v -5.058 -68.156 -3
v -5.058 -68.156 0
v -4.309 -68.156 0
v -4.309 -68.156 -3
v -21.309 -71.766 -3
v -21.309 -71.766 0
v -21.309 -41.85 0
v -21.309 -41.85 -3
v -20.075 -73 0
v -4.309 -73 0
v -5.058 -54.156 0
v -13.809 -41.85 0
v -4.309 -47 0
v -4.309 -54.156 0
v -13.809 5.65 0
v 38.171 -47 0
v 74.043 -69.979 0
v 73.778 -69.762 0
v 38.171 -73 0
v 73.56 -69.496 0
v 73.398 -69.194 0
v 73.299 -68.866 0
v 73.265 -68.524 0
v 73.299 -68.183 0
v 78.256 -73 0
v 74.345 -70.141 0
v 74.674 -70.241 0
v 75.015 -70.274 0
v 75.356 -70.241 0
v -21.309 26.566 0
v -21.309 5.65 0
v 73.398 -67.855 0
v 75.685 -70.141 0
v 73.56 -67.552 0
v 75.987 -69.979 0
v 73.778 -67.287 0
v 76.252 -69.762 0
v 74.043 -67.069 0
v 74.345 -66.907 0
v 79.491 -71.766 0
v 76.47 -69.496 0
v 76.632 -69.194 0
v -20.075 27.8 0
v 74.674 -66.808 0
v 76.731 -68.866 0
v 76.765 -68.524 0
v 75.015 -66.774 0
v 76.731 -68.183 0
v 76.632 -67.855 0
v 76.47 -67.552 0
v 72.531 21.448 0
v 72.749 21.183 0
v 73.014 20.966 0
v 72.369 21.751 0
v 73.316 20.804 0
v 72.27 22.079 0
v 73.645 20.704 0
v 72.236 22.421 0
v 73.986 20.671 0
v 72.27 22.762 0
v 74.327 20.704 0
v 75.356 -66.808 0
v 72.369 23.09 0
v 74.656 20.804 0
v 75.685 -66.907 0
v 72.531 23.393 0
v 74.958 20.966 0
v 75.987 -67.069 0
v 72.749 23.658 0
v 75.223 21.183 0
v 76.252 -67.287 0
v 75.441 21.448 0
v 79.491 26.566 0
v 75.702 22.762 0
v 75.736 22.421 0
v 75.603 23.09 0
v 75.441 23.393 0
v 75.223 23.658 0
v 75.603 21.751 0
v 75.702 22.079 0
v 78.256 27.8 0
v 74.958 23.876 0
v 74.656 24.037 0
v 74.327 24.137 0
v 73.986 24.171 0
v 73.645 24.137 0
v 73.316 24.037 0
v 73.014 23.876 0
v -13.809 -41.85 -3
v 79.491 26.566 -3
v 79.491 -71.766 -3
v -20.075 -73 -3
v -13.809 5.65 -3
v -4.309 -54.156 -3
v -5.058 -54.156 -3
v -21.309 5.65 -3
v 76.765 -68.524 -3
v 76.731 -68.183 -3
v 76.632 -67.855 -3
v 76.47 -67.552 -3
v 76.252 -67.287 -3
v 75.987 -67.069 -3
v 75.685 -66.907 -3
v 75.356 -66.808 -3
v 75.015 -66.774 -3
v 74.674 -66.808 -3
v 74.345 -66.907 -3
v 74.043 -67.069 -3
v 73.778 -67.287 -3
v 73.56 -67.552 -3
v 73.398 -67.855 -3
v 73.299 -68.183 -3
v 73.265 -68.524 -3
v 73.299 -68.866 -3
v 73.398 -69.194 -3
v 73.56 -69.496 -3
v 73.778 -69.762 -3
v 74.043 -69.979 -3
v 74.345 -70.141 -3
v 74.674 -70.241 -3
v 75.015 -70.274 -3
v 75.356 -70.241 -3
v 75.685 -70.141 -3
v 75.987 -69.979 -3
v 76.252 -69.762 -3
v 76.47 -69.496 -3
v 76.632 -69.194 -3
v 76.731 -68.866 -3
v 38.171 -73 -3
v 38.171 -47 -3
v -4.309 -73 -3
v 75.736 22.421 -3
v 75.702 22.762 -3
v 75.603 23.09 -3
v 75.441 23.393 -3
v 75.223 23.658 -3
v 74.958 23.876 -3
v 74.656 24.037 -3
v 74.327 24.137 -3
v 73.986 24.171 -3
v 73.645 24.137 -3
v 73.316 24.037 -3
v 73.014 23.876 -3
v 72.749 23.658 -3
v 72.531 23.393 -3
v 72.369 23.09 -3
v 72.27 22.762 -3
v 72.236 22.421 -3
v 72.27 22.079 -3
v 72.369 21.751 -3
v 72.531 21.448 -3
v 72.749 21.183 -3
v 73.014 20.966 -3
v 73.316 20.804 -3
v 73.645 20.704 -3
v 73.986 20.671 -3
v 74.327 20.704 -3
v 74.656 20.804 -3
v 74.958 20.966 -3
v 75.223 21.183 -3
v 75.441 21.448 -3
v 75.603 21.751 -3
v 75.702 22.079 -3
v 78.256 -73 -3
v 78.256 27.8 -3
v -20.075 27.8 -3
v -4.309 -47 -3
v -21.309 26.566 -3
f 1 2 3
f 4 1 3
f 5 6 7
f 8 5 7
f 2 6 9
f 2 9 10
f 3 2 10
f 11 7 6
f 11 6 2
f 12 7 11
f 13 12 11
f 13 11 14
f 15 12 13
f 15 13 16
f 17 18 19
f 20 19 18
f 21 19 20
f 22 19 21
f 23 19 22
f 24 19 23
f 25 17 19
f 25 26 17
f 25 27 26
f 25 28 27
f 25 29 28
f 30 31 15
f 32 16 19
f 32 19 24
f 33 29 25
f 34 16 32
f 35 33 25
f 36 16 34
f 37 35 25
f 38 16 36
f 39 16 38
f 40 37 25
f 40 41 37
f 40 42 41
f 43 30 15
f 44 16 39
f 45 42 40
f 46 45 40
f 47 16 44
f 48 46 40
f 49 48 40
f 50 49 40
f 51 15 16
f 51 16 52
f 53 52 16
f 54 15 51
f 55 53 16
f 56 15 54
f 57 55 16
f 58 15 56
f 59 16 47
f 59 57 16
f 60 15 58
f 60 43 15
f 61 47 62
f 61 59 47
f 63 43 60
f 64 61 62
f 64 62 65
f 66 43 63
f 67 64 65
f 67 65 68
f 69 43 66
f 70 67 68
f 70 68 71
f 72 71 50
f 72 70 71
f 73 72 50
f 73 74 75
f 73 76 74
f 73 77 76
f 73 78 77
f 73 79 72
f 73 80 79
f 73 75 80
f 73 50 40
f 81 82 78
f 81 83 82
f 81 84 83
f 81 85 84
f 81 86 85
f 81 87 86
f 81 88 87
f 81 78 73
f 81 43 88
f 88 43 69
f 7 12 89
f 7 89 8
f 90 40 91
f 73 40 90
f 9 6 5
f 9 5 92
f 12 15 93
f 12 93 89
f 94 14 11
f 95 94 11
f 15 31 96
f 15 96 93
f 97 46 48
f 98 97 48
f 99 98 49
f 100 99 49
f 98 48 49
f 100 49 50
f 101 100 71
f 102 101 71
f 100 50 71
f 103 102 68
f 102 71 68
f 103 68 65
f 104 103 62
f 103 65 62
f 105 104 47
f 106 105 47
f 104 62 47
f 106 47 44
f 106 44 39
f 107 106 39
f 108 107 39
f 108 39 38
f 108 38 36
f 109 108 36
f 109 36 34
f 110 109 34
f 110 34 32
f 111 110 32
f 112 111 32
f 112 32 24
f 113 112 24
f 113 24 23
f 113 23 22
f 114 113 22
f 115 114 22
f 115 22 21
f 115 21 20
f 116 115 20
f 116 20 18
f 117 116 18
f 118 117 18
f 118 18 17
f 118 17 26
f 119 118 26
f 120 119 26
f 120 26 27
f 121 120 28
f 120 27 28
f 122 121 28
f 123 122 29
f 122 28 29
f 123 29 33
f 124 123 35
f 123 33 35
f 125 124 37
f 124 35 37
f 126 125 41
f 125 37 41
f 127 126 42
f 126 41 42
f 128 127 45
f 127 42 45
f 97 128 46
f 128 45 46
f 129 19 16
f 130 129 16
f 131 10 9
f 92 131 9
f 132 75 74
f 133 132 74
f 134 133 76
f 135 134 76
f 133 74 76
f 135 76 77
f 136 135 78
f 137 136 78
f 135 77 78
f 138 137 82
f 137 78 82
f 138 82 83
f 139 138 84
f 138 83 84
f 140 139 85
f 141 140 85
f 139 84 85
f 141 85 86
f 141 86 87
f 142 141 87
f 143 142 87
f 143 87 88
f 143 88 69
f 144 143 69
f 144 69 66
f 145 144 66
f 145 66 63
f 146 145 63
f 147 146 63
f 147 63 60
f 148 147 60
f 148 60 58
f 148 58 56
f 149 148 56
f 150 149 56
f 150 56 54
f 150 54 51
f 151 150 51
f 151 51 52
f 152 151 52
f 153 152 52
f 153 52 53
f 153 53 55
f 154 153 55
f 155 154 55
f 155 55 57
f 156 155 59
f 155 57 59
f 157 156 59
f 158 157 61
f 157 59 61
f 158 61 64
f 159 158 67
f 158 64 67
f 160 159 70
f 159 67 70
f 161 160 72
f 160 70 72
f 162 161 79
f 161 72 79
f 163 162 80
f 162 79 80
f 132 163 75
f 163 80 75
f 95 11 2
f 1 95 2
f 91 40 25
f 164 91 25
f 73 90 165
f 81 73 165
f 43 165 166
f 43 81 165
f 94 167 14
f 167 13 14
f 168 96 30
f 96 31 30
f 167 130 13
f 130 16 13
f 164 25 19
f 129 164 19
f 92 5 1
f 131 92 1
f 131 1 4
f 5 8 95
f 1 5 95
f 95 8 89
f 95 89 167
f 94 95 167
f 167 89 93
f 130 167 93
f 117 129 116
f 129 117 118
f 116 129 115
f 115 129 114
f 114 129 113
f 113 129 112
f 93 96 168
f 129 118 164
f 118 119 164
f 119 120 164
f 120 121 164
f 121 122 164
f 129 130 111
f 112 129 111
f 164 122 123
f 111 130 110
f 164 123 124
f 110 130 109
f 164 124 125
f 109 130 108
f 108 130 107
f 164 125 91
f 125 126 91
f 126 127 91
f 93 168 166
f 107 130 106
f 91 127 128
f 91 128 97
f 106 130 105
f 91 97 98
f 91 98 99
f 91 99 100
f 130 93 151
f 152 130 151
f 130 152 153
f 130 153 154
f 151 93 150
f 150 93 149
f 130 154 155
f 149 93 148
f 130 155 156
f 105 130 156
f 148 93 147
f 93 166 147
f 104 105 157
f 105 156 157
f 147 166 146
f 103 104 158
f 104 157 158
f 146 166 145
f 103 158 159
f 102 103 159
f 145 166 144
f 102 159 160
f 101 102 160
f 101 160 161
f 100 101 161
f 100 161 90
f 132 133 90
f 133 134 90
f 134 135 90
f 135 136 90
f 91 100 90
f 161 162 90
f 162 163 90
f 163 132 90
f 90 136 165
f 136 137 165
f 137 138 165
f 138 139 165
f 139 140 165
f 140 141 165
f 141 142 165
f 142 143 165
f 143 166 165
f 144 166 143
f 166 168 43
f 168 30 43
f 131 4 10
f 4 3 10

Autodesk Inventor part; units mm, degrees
ref_plane "YZ Plane" through (0, 0, 0) normal (1, 0, 0) x (0, 1, 0)
ref_plane "XZ Plane" through (0, 0, 0) normal (0, 1, 0) x (-1, 0, 0)
ref_plane "XY Plane" through (0, 0, 0) normal (0, 0, 1) x (1, 0, 0)
sketch "Sketch1" plane through (0, 0, 0) normal (0, 0, 1) x (1, 0, 0)
  line L0 (81.4908, -72.5941) -> (81.4908, 27.3941)
  line L1 (79.0849, 29.8) -> (81.4908, 27.3941)
  line L2 (-20.9033, 29.8) -> (79.0849, 29.8)
  line L3 (-23.3092, 27.3941) -> (-20.9033, 29.8)
  line L4 (-23.3092, -72.5941) -> (-23.3092, 27.3941)
  line L5 (-20.9033, -75) -> (-23.3092, -72.5941)
  line L6 (-4.3092, -75) -> (-20.9033, -75)
  line L7 (-4.3092, -73) -> (-4.3092, -75)
  line L8 (-4.3092, -73) -> (-20.0749, -73)
  line L9 (-21.3092, -71.7657) -> (-21.3092, 26.5657)
  line L10 (78.2565, 27.8) -> (-20.0749, 27.8)
  line L11 (79.4908, 26.5657) -> (78.2565, 27.8)
  line L12 (79.4908, -71.7657) -> (79.4908, 26.5657)
  line L13 (79.4908, -71.7657) -> (78.2565, -73)
  line L14 (78.2565, -73) -> (32.1708, -73)
  line L15 (32.1708, -75) -> (32.1708, -73)
  line L16 (79.0849, -75) -> (32.1708, -75)
  line L17 (79.0849, -75) -> (81.4908, -72.5941)
  line L18 (-4.3092, -75) -> (-23.3092, -75)
  line L19 (-23.3092, -75) -> (-23.3092, -73)
  line L20 (-23.3092, -73) -> (-4.3092, -73)
  line L21 (-4.3092, -73) -> (-4.3092, -75)
  line L22 (-21.3092, -59.0157) -> (-23.3092, -59.0157)
  line L23 (-23.3092, -59.0157) -> (-23.3092, -75)
  line L24 (-23.3092, -75) -> (-21.3092, -75)
  line L25 (-21.3092, -75) -> (-21.3092, -59.0157)
  line L26 (-20.9092, 18.65) -> (-20.9092, 26.4) construction
  line L27 (-20.9092, 26.4) -> (-19.9092, 27.4) construction
  line L28 (-19.9092, 27.4) -> (-12.1888, 27.4) construction
  line L29 (-21.3092, 18.65) -> (-21.3092, 26.5657)
  line L30 (-21.3092, 26.5657) -> (-20.0749, 27.8)
  line L31 (-20.0749, 27.8) -> (-12.1888, 27.8)
  line L32 (-22.7184, -70.3564) -> (-18.2476, -74.8272)
  line L33 (-22.7184, -70.3564) -> (-16.3958, -70.3564) construction
  line L34 (-4.3092, -75) -> (32.1708, -75)
  line L35 (32.1708, -75) -> (32.1708, -47)
  line L36 (32.1708, -47) -> (-4.3092, -47)
  line L37 (-4.3092, -47) -> (-4.3092, -75)
  circle A0 centre (-17.5342, -45.35) radius 1.75
  circle A1 centre (73.986, 22.4207) radius 1.75
  circle A2 centre (75.015, -68.5242) radius 1.75
  line L38 (-20.0749, -73) -> (-21.3092, -71.7657)
  line L39 (-21.3092, 26.5657) -> (-20.0749, 27.8)
  point P0 (0, 0)
  point P1 (-7.3249, -73)
  point P2 (-21.3092, -71.7657)
  point P3 (-20.0749, -73)
  point P4 (-17.9077, 27.8)
  point P5 (-21.3092, 18.65)
  point P6 (-21.3092, -74.5941)
extrude "Extrusion1" add sketch "Sketch1" against normal blind 3 contours L35 L36 L37 L8 L32 L9 L30 L10 L11 L12 L13 L14
sketch "Sketch2" plane through (0, 0, 0) normal (0, 0, 1) x (1, 0, 0)
  line L0 (-21.3092, -71.7657) -> (-21.3092, 26.5657) projected
  line L1 (-21.3092, 5.65) -> (-13.8092, 5.65)
  line L2 (-13.8092, 5.65) -> (-13.8092, -41.85)
  line L3 (-13.8092, -41.85) -> (-21.3092, -41.85)
  line L4 (-21.3092, -41.85) -> (-21.3092, 5.65)
  circle A0 centre (-17.5342, -45.35) radius 1.75 projected
  point P0 (0, 0)
  point P1 (-17.5592, 5.65)
  dimension "d6" = 7.5
  dimension "d7" = 3.5
  dimension "d8" = 47.5
extrude "Extrusion2" cut sketch "Sketch2" against normal blind 3 contours L0 L1 L2 L3
sketch "Sketch3" plane through (0, 0, 0) normal (0, 0, 1) x (1, 0, 0)
  circle A0 centre (-17.5342, -45.35) radius 1.75 projected
  point P0 (0, 0)
extrude "Extrusion3" add sketch "Sketch3" against normal up to surface (3 mm away)
sketch "Sketch4" plane through (0, 0, 0) normal (0, 0, 1) x (1, 0, 0)
  line L0 (-3.3235, -61.1555) -> (-1.2915, -61.1555) projected
  line L1 (0.4425, -54.1555) -> (-5.0575, -54.1555)
  line L2 (-5.0575, -54.1555) -> (-5.0575, -68.1555)
  line L3 (-5.0575, -68.1555) -> (0.4425, -68.1555)
  line L4 (0.4425, -68.1555) -> (0.4425, -54.1555)
  line L5 (0.4425, -54.1555) -> (-5.0575, -68.1555) construction
  line L6 (-5.0575, -54.1555) -> (0.4425, -68.1555) construction
  point P0 (0, 0)
  point P1 (-2.3075, -61.1555)
  dimension "d13" = 5.5
  dimension "d14" = 14
extrude "Extrusion4" cut sketch "Sketch4" against normal up to surface (3 mm away)
sketch "Sketch5" plane through (0, 0, 0) normal (0, 0, 1) x (1, 0, 0)
  point P0 (0, 0)
sketch "Sketch6" plane through (0, 0, 0) normal (0, 0, 1) x (1, 0, 0)
  line L0 (-5.0575, -54.1555) -> (-4.3092, -54.1555) projected
  line L1 (-4.3092, -54.1555) -> (-4.3092, -47) projected
  line L2 (-4.3092, -47) -> (32.1708, -47) projected
  line L3 (32.1708, -47) -> (32.1708, -73) projected
  line L4 (32.1708, -73) -> (78.2565, -73) projected
  line L5 (78.2565, -73) -> (79.4908, -71.7657) projected
  line L6 (79.4908, -71.7657) -> (79.4908, 26.5657) projected
  line L7 (79.4908, 26.5657) -> (78.2565, 27.8) projected
  line L8 (78.2565, 27.8) -> (-20.0749, 27.8) projected
  line L9 (-20.0749, 27.8) -> (-21.3092, 26.5657) projected
  line L10 (-21.3092, 26.5657) -> (-21.3092, 5.65) projected
  line L11 (-21.3092, 5.65) -> (-13.8092, 5.65) projected
  line L12 (-13.8092, 5.65) -> (-13.8092, -41.85) projected
  line L13 (-13.8092, -41.85) -> (-21.3092, -41.85) projected
  line L14 (-21.3092, -41.85) -> (-21.3092, -71.7657) projected
  line L15 (-21.3092, -71.7657) -> (-20.0749, -73) projected
  line L16 (-20.0749, -73) -> (-4.3092, -73) projected
  line L17 (-4.3092, -73) -> (-4.3092, -68.1555) projected
  line L18 (-4.3092, -68.1555) -> (-5.0575, -68.1555) projected
  line L19 (-5.0575, -68.1555) -> (-5.0575, -54.1555) projected
  circle A0 centre (75.015, -68.5242) radius 1.75 projected
  circle A1 centre (73.986, 22.4207) radius 1.75 projected
  line L20 (32.1708, -73) -> (38.1708, -73)
  line L21 (38.1708, -73) -> (38.1708, -47)
  line L22 (38.1708, -47) -> (32.1708, -47)
  line L23 (32.1708, -47) -> (32.1708, -73)
  point P0 (0, 0)
  dimension "d17" = 6
extrude "Extrusion5" cut sketch "Sketch6" against normal blind 10 contours L22 L21 L4 L3
properties part number "Lid_clear"
